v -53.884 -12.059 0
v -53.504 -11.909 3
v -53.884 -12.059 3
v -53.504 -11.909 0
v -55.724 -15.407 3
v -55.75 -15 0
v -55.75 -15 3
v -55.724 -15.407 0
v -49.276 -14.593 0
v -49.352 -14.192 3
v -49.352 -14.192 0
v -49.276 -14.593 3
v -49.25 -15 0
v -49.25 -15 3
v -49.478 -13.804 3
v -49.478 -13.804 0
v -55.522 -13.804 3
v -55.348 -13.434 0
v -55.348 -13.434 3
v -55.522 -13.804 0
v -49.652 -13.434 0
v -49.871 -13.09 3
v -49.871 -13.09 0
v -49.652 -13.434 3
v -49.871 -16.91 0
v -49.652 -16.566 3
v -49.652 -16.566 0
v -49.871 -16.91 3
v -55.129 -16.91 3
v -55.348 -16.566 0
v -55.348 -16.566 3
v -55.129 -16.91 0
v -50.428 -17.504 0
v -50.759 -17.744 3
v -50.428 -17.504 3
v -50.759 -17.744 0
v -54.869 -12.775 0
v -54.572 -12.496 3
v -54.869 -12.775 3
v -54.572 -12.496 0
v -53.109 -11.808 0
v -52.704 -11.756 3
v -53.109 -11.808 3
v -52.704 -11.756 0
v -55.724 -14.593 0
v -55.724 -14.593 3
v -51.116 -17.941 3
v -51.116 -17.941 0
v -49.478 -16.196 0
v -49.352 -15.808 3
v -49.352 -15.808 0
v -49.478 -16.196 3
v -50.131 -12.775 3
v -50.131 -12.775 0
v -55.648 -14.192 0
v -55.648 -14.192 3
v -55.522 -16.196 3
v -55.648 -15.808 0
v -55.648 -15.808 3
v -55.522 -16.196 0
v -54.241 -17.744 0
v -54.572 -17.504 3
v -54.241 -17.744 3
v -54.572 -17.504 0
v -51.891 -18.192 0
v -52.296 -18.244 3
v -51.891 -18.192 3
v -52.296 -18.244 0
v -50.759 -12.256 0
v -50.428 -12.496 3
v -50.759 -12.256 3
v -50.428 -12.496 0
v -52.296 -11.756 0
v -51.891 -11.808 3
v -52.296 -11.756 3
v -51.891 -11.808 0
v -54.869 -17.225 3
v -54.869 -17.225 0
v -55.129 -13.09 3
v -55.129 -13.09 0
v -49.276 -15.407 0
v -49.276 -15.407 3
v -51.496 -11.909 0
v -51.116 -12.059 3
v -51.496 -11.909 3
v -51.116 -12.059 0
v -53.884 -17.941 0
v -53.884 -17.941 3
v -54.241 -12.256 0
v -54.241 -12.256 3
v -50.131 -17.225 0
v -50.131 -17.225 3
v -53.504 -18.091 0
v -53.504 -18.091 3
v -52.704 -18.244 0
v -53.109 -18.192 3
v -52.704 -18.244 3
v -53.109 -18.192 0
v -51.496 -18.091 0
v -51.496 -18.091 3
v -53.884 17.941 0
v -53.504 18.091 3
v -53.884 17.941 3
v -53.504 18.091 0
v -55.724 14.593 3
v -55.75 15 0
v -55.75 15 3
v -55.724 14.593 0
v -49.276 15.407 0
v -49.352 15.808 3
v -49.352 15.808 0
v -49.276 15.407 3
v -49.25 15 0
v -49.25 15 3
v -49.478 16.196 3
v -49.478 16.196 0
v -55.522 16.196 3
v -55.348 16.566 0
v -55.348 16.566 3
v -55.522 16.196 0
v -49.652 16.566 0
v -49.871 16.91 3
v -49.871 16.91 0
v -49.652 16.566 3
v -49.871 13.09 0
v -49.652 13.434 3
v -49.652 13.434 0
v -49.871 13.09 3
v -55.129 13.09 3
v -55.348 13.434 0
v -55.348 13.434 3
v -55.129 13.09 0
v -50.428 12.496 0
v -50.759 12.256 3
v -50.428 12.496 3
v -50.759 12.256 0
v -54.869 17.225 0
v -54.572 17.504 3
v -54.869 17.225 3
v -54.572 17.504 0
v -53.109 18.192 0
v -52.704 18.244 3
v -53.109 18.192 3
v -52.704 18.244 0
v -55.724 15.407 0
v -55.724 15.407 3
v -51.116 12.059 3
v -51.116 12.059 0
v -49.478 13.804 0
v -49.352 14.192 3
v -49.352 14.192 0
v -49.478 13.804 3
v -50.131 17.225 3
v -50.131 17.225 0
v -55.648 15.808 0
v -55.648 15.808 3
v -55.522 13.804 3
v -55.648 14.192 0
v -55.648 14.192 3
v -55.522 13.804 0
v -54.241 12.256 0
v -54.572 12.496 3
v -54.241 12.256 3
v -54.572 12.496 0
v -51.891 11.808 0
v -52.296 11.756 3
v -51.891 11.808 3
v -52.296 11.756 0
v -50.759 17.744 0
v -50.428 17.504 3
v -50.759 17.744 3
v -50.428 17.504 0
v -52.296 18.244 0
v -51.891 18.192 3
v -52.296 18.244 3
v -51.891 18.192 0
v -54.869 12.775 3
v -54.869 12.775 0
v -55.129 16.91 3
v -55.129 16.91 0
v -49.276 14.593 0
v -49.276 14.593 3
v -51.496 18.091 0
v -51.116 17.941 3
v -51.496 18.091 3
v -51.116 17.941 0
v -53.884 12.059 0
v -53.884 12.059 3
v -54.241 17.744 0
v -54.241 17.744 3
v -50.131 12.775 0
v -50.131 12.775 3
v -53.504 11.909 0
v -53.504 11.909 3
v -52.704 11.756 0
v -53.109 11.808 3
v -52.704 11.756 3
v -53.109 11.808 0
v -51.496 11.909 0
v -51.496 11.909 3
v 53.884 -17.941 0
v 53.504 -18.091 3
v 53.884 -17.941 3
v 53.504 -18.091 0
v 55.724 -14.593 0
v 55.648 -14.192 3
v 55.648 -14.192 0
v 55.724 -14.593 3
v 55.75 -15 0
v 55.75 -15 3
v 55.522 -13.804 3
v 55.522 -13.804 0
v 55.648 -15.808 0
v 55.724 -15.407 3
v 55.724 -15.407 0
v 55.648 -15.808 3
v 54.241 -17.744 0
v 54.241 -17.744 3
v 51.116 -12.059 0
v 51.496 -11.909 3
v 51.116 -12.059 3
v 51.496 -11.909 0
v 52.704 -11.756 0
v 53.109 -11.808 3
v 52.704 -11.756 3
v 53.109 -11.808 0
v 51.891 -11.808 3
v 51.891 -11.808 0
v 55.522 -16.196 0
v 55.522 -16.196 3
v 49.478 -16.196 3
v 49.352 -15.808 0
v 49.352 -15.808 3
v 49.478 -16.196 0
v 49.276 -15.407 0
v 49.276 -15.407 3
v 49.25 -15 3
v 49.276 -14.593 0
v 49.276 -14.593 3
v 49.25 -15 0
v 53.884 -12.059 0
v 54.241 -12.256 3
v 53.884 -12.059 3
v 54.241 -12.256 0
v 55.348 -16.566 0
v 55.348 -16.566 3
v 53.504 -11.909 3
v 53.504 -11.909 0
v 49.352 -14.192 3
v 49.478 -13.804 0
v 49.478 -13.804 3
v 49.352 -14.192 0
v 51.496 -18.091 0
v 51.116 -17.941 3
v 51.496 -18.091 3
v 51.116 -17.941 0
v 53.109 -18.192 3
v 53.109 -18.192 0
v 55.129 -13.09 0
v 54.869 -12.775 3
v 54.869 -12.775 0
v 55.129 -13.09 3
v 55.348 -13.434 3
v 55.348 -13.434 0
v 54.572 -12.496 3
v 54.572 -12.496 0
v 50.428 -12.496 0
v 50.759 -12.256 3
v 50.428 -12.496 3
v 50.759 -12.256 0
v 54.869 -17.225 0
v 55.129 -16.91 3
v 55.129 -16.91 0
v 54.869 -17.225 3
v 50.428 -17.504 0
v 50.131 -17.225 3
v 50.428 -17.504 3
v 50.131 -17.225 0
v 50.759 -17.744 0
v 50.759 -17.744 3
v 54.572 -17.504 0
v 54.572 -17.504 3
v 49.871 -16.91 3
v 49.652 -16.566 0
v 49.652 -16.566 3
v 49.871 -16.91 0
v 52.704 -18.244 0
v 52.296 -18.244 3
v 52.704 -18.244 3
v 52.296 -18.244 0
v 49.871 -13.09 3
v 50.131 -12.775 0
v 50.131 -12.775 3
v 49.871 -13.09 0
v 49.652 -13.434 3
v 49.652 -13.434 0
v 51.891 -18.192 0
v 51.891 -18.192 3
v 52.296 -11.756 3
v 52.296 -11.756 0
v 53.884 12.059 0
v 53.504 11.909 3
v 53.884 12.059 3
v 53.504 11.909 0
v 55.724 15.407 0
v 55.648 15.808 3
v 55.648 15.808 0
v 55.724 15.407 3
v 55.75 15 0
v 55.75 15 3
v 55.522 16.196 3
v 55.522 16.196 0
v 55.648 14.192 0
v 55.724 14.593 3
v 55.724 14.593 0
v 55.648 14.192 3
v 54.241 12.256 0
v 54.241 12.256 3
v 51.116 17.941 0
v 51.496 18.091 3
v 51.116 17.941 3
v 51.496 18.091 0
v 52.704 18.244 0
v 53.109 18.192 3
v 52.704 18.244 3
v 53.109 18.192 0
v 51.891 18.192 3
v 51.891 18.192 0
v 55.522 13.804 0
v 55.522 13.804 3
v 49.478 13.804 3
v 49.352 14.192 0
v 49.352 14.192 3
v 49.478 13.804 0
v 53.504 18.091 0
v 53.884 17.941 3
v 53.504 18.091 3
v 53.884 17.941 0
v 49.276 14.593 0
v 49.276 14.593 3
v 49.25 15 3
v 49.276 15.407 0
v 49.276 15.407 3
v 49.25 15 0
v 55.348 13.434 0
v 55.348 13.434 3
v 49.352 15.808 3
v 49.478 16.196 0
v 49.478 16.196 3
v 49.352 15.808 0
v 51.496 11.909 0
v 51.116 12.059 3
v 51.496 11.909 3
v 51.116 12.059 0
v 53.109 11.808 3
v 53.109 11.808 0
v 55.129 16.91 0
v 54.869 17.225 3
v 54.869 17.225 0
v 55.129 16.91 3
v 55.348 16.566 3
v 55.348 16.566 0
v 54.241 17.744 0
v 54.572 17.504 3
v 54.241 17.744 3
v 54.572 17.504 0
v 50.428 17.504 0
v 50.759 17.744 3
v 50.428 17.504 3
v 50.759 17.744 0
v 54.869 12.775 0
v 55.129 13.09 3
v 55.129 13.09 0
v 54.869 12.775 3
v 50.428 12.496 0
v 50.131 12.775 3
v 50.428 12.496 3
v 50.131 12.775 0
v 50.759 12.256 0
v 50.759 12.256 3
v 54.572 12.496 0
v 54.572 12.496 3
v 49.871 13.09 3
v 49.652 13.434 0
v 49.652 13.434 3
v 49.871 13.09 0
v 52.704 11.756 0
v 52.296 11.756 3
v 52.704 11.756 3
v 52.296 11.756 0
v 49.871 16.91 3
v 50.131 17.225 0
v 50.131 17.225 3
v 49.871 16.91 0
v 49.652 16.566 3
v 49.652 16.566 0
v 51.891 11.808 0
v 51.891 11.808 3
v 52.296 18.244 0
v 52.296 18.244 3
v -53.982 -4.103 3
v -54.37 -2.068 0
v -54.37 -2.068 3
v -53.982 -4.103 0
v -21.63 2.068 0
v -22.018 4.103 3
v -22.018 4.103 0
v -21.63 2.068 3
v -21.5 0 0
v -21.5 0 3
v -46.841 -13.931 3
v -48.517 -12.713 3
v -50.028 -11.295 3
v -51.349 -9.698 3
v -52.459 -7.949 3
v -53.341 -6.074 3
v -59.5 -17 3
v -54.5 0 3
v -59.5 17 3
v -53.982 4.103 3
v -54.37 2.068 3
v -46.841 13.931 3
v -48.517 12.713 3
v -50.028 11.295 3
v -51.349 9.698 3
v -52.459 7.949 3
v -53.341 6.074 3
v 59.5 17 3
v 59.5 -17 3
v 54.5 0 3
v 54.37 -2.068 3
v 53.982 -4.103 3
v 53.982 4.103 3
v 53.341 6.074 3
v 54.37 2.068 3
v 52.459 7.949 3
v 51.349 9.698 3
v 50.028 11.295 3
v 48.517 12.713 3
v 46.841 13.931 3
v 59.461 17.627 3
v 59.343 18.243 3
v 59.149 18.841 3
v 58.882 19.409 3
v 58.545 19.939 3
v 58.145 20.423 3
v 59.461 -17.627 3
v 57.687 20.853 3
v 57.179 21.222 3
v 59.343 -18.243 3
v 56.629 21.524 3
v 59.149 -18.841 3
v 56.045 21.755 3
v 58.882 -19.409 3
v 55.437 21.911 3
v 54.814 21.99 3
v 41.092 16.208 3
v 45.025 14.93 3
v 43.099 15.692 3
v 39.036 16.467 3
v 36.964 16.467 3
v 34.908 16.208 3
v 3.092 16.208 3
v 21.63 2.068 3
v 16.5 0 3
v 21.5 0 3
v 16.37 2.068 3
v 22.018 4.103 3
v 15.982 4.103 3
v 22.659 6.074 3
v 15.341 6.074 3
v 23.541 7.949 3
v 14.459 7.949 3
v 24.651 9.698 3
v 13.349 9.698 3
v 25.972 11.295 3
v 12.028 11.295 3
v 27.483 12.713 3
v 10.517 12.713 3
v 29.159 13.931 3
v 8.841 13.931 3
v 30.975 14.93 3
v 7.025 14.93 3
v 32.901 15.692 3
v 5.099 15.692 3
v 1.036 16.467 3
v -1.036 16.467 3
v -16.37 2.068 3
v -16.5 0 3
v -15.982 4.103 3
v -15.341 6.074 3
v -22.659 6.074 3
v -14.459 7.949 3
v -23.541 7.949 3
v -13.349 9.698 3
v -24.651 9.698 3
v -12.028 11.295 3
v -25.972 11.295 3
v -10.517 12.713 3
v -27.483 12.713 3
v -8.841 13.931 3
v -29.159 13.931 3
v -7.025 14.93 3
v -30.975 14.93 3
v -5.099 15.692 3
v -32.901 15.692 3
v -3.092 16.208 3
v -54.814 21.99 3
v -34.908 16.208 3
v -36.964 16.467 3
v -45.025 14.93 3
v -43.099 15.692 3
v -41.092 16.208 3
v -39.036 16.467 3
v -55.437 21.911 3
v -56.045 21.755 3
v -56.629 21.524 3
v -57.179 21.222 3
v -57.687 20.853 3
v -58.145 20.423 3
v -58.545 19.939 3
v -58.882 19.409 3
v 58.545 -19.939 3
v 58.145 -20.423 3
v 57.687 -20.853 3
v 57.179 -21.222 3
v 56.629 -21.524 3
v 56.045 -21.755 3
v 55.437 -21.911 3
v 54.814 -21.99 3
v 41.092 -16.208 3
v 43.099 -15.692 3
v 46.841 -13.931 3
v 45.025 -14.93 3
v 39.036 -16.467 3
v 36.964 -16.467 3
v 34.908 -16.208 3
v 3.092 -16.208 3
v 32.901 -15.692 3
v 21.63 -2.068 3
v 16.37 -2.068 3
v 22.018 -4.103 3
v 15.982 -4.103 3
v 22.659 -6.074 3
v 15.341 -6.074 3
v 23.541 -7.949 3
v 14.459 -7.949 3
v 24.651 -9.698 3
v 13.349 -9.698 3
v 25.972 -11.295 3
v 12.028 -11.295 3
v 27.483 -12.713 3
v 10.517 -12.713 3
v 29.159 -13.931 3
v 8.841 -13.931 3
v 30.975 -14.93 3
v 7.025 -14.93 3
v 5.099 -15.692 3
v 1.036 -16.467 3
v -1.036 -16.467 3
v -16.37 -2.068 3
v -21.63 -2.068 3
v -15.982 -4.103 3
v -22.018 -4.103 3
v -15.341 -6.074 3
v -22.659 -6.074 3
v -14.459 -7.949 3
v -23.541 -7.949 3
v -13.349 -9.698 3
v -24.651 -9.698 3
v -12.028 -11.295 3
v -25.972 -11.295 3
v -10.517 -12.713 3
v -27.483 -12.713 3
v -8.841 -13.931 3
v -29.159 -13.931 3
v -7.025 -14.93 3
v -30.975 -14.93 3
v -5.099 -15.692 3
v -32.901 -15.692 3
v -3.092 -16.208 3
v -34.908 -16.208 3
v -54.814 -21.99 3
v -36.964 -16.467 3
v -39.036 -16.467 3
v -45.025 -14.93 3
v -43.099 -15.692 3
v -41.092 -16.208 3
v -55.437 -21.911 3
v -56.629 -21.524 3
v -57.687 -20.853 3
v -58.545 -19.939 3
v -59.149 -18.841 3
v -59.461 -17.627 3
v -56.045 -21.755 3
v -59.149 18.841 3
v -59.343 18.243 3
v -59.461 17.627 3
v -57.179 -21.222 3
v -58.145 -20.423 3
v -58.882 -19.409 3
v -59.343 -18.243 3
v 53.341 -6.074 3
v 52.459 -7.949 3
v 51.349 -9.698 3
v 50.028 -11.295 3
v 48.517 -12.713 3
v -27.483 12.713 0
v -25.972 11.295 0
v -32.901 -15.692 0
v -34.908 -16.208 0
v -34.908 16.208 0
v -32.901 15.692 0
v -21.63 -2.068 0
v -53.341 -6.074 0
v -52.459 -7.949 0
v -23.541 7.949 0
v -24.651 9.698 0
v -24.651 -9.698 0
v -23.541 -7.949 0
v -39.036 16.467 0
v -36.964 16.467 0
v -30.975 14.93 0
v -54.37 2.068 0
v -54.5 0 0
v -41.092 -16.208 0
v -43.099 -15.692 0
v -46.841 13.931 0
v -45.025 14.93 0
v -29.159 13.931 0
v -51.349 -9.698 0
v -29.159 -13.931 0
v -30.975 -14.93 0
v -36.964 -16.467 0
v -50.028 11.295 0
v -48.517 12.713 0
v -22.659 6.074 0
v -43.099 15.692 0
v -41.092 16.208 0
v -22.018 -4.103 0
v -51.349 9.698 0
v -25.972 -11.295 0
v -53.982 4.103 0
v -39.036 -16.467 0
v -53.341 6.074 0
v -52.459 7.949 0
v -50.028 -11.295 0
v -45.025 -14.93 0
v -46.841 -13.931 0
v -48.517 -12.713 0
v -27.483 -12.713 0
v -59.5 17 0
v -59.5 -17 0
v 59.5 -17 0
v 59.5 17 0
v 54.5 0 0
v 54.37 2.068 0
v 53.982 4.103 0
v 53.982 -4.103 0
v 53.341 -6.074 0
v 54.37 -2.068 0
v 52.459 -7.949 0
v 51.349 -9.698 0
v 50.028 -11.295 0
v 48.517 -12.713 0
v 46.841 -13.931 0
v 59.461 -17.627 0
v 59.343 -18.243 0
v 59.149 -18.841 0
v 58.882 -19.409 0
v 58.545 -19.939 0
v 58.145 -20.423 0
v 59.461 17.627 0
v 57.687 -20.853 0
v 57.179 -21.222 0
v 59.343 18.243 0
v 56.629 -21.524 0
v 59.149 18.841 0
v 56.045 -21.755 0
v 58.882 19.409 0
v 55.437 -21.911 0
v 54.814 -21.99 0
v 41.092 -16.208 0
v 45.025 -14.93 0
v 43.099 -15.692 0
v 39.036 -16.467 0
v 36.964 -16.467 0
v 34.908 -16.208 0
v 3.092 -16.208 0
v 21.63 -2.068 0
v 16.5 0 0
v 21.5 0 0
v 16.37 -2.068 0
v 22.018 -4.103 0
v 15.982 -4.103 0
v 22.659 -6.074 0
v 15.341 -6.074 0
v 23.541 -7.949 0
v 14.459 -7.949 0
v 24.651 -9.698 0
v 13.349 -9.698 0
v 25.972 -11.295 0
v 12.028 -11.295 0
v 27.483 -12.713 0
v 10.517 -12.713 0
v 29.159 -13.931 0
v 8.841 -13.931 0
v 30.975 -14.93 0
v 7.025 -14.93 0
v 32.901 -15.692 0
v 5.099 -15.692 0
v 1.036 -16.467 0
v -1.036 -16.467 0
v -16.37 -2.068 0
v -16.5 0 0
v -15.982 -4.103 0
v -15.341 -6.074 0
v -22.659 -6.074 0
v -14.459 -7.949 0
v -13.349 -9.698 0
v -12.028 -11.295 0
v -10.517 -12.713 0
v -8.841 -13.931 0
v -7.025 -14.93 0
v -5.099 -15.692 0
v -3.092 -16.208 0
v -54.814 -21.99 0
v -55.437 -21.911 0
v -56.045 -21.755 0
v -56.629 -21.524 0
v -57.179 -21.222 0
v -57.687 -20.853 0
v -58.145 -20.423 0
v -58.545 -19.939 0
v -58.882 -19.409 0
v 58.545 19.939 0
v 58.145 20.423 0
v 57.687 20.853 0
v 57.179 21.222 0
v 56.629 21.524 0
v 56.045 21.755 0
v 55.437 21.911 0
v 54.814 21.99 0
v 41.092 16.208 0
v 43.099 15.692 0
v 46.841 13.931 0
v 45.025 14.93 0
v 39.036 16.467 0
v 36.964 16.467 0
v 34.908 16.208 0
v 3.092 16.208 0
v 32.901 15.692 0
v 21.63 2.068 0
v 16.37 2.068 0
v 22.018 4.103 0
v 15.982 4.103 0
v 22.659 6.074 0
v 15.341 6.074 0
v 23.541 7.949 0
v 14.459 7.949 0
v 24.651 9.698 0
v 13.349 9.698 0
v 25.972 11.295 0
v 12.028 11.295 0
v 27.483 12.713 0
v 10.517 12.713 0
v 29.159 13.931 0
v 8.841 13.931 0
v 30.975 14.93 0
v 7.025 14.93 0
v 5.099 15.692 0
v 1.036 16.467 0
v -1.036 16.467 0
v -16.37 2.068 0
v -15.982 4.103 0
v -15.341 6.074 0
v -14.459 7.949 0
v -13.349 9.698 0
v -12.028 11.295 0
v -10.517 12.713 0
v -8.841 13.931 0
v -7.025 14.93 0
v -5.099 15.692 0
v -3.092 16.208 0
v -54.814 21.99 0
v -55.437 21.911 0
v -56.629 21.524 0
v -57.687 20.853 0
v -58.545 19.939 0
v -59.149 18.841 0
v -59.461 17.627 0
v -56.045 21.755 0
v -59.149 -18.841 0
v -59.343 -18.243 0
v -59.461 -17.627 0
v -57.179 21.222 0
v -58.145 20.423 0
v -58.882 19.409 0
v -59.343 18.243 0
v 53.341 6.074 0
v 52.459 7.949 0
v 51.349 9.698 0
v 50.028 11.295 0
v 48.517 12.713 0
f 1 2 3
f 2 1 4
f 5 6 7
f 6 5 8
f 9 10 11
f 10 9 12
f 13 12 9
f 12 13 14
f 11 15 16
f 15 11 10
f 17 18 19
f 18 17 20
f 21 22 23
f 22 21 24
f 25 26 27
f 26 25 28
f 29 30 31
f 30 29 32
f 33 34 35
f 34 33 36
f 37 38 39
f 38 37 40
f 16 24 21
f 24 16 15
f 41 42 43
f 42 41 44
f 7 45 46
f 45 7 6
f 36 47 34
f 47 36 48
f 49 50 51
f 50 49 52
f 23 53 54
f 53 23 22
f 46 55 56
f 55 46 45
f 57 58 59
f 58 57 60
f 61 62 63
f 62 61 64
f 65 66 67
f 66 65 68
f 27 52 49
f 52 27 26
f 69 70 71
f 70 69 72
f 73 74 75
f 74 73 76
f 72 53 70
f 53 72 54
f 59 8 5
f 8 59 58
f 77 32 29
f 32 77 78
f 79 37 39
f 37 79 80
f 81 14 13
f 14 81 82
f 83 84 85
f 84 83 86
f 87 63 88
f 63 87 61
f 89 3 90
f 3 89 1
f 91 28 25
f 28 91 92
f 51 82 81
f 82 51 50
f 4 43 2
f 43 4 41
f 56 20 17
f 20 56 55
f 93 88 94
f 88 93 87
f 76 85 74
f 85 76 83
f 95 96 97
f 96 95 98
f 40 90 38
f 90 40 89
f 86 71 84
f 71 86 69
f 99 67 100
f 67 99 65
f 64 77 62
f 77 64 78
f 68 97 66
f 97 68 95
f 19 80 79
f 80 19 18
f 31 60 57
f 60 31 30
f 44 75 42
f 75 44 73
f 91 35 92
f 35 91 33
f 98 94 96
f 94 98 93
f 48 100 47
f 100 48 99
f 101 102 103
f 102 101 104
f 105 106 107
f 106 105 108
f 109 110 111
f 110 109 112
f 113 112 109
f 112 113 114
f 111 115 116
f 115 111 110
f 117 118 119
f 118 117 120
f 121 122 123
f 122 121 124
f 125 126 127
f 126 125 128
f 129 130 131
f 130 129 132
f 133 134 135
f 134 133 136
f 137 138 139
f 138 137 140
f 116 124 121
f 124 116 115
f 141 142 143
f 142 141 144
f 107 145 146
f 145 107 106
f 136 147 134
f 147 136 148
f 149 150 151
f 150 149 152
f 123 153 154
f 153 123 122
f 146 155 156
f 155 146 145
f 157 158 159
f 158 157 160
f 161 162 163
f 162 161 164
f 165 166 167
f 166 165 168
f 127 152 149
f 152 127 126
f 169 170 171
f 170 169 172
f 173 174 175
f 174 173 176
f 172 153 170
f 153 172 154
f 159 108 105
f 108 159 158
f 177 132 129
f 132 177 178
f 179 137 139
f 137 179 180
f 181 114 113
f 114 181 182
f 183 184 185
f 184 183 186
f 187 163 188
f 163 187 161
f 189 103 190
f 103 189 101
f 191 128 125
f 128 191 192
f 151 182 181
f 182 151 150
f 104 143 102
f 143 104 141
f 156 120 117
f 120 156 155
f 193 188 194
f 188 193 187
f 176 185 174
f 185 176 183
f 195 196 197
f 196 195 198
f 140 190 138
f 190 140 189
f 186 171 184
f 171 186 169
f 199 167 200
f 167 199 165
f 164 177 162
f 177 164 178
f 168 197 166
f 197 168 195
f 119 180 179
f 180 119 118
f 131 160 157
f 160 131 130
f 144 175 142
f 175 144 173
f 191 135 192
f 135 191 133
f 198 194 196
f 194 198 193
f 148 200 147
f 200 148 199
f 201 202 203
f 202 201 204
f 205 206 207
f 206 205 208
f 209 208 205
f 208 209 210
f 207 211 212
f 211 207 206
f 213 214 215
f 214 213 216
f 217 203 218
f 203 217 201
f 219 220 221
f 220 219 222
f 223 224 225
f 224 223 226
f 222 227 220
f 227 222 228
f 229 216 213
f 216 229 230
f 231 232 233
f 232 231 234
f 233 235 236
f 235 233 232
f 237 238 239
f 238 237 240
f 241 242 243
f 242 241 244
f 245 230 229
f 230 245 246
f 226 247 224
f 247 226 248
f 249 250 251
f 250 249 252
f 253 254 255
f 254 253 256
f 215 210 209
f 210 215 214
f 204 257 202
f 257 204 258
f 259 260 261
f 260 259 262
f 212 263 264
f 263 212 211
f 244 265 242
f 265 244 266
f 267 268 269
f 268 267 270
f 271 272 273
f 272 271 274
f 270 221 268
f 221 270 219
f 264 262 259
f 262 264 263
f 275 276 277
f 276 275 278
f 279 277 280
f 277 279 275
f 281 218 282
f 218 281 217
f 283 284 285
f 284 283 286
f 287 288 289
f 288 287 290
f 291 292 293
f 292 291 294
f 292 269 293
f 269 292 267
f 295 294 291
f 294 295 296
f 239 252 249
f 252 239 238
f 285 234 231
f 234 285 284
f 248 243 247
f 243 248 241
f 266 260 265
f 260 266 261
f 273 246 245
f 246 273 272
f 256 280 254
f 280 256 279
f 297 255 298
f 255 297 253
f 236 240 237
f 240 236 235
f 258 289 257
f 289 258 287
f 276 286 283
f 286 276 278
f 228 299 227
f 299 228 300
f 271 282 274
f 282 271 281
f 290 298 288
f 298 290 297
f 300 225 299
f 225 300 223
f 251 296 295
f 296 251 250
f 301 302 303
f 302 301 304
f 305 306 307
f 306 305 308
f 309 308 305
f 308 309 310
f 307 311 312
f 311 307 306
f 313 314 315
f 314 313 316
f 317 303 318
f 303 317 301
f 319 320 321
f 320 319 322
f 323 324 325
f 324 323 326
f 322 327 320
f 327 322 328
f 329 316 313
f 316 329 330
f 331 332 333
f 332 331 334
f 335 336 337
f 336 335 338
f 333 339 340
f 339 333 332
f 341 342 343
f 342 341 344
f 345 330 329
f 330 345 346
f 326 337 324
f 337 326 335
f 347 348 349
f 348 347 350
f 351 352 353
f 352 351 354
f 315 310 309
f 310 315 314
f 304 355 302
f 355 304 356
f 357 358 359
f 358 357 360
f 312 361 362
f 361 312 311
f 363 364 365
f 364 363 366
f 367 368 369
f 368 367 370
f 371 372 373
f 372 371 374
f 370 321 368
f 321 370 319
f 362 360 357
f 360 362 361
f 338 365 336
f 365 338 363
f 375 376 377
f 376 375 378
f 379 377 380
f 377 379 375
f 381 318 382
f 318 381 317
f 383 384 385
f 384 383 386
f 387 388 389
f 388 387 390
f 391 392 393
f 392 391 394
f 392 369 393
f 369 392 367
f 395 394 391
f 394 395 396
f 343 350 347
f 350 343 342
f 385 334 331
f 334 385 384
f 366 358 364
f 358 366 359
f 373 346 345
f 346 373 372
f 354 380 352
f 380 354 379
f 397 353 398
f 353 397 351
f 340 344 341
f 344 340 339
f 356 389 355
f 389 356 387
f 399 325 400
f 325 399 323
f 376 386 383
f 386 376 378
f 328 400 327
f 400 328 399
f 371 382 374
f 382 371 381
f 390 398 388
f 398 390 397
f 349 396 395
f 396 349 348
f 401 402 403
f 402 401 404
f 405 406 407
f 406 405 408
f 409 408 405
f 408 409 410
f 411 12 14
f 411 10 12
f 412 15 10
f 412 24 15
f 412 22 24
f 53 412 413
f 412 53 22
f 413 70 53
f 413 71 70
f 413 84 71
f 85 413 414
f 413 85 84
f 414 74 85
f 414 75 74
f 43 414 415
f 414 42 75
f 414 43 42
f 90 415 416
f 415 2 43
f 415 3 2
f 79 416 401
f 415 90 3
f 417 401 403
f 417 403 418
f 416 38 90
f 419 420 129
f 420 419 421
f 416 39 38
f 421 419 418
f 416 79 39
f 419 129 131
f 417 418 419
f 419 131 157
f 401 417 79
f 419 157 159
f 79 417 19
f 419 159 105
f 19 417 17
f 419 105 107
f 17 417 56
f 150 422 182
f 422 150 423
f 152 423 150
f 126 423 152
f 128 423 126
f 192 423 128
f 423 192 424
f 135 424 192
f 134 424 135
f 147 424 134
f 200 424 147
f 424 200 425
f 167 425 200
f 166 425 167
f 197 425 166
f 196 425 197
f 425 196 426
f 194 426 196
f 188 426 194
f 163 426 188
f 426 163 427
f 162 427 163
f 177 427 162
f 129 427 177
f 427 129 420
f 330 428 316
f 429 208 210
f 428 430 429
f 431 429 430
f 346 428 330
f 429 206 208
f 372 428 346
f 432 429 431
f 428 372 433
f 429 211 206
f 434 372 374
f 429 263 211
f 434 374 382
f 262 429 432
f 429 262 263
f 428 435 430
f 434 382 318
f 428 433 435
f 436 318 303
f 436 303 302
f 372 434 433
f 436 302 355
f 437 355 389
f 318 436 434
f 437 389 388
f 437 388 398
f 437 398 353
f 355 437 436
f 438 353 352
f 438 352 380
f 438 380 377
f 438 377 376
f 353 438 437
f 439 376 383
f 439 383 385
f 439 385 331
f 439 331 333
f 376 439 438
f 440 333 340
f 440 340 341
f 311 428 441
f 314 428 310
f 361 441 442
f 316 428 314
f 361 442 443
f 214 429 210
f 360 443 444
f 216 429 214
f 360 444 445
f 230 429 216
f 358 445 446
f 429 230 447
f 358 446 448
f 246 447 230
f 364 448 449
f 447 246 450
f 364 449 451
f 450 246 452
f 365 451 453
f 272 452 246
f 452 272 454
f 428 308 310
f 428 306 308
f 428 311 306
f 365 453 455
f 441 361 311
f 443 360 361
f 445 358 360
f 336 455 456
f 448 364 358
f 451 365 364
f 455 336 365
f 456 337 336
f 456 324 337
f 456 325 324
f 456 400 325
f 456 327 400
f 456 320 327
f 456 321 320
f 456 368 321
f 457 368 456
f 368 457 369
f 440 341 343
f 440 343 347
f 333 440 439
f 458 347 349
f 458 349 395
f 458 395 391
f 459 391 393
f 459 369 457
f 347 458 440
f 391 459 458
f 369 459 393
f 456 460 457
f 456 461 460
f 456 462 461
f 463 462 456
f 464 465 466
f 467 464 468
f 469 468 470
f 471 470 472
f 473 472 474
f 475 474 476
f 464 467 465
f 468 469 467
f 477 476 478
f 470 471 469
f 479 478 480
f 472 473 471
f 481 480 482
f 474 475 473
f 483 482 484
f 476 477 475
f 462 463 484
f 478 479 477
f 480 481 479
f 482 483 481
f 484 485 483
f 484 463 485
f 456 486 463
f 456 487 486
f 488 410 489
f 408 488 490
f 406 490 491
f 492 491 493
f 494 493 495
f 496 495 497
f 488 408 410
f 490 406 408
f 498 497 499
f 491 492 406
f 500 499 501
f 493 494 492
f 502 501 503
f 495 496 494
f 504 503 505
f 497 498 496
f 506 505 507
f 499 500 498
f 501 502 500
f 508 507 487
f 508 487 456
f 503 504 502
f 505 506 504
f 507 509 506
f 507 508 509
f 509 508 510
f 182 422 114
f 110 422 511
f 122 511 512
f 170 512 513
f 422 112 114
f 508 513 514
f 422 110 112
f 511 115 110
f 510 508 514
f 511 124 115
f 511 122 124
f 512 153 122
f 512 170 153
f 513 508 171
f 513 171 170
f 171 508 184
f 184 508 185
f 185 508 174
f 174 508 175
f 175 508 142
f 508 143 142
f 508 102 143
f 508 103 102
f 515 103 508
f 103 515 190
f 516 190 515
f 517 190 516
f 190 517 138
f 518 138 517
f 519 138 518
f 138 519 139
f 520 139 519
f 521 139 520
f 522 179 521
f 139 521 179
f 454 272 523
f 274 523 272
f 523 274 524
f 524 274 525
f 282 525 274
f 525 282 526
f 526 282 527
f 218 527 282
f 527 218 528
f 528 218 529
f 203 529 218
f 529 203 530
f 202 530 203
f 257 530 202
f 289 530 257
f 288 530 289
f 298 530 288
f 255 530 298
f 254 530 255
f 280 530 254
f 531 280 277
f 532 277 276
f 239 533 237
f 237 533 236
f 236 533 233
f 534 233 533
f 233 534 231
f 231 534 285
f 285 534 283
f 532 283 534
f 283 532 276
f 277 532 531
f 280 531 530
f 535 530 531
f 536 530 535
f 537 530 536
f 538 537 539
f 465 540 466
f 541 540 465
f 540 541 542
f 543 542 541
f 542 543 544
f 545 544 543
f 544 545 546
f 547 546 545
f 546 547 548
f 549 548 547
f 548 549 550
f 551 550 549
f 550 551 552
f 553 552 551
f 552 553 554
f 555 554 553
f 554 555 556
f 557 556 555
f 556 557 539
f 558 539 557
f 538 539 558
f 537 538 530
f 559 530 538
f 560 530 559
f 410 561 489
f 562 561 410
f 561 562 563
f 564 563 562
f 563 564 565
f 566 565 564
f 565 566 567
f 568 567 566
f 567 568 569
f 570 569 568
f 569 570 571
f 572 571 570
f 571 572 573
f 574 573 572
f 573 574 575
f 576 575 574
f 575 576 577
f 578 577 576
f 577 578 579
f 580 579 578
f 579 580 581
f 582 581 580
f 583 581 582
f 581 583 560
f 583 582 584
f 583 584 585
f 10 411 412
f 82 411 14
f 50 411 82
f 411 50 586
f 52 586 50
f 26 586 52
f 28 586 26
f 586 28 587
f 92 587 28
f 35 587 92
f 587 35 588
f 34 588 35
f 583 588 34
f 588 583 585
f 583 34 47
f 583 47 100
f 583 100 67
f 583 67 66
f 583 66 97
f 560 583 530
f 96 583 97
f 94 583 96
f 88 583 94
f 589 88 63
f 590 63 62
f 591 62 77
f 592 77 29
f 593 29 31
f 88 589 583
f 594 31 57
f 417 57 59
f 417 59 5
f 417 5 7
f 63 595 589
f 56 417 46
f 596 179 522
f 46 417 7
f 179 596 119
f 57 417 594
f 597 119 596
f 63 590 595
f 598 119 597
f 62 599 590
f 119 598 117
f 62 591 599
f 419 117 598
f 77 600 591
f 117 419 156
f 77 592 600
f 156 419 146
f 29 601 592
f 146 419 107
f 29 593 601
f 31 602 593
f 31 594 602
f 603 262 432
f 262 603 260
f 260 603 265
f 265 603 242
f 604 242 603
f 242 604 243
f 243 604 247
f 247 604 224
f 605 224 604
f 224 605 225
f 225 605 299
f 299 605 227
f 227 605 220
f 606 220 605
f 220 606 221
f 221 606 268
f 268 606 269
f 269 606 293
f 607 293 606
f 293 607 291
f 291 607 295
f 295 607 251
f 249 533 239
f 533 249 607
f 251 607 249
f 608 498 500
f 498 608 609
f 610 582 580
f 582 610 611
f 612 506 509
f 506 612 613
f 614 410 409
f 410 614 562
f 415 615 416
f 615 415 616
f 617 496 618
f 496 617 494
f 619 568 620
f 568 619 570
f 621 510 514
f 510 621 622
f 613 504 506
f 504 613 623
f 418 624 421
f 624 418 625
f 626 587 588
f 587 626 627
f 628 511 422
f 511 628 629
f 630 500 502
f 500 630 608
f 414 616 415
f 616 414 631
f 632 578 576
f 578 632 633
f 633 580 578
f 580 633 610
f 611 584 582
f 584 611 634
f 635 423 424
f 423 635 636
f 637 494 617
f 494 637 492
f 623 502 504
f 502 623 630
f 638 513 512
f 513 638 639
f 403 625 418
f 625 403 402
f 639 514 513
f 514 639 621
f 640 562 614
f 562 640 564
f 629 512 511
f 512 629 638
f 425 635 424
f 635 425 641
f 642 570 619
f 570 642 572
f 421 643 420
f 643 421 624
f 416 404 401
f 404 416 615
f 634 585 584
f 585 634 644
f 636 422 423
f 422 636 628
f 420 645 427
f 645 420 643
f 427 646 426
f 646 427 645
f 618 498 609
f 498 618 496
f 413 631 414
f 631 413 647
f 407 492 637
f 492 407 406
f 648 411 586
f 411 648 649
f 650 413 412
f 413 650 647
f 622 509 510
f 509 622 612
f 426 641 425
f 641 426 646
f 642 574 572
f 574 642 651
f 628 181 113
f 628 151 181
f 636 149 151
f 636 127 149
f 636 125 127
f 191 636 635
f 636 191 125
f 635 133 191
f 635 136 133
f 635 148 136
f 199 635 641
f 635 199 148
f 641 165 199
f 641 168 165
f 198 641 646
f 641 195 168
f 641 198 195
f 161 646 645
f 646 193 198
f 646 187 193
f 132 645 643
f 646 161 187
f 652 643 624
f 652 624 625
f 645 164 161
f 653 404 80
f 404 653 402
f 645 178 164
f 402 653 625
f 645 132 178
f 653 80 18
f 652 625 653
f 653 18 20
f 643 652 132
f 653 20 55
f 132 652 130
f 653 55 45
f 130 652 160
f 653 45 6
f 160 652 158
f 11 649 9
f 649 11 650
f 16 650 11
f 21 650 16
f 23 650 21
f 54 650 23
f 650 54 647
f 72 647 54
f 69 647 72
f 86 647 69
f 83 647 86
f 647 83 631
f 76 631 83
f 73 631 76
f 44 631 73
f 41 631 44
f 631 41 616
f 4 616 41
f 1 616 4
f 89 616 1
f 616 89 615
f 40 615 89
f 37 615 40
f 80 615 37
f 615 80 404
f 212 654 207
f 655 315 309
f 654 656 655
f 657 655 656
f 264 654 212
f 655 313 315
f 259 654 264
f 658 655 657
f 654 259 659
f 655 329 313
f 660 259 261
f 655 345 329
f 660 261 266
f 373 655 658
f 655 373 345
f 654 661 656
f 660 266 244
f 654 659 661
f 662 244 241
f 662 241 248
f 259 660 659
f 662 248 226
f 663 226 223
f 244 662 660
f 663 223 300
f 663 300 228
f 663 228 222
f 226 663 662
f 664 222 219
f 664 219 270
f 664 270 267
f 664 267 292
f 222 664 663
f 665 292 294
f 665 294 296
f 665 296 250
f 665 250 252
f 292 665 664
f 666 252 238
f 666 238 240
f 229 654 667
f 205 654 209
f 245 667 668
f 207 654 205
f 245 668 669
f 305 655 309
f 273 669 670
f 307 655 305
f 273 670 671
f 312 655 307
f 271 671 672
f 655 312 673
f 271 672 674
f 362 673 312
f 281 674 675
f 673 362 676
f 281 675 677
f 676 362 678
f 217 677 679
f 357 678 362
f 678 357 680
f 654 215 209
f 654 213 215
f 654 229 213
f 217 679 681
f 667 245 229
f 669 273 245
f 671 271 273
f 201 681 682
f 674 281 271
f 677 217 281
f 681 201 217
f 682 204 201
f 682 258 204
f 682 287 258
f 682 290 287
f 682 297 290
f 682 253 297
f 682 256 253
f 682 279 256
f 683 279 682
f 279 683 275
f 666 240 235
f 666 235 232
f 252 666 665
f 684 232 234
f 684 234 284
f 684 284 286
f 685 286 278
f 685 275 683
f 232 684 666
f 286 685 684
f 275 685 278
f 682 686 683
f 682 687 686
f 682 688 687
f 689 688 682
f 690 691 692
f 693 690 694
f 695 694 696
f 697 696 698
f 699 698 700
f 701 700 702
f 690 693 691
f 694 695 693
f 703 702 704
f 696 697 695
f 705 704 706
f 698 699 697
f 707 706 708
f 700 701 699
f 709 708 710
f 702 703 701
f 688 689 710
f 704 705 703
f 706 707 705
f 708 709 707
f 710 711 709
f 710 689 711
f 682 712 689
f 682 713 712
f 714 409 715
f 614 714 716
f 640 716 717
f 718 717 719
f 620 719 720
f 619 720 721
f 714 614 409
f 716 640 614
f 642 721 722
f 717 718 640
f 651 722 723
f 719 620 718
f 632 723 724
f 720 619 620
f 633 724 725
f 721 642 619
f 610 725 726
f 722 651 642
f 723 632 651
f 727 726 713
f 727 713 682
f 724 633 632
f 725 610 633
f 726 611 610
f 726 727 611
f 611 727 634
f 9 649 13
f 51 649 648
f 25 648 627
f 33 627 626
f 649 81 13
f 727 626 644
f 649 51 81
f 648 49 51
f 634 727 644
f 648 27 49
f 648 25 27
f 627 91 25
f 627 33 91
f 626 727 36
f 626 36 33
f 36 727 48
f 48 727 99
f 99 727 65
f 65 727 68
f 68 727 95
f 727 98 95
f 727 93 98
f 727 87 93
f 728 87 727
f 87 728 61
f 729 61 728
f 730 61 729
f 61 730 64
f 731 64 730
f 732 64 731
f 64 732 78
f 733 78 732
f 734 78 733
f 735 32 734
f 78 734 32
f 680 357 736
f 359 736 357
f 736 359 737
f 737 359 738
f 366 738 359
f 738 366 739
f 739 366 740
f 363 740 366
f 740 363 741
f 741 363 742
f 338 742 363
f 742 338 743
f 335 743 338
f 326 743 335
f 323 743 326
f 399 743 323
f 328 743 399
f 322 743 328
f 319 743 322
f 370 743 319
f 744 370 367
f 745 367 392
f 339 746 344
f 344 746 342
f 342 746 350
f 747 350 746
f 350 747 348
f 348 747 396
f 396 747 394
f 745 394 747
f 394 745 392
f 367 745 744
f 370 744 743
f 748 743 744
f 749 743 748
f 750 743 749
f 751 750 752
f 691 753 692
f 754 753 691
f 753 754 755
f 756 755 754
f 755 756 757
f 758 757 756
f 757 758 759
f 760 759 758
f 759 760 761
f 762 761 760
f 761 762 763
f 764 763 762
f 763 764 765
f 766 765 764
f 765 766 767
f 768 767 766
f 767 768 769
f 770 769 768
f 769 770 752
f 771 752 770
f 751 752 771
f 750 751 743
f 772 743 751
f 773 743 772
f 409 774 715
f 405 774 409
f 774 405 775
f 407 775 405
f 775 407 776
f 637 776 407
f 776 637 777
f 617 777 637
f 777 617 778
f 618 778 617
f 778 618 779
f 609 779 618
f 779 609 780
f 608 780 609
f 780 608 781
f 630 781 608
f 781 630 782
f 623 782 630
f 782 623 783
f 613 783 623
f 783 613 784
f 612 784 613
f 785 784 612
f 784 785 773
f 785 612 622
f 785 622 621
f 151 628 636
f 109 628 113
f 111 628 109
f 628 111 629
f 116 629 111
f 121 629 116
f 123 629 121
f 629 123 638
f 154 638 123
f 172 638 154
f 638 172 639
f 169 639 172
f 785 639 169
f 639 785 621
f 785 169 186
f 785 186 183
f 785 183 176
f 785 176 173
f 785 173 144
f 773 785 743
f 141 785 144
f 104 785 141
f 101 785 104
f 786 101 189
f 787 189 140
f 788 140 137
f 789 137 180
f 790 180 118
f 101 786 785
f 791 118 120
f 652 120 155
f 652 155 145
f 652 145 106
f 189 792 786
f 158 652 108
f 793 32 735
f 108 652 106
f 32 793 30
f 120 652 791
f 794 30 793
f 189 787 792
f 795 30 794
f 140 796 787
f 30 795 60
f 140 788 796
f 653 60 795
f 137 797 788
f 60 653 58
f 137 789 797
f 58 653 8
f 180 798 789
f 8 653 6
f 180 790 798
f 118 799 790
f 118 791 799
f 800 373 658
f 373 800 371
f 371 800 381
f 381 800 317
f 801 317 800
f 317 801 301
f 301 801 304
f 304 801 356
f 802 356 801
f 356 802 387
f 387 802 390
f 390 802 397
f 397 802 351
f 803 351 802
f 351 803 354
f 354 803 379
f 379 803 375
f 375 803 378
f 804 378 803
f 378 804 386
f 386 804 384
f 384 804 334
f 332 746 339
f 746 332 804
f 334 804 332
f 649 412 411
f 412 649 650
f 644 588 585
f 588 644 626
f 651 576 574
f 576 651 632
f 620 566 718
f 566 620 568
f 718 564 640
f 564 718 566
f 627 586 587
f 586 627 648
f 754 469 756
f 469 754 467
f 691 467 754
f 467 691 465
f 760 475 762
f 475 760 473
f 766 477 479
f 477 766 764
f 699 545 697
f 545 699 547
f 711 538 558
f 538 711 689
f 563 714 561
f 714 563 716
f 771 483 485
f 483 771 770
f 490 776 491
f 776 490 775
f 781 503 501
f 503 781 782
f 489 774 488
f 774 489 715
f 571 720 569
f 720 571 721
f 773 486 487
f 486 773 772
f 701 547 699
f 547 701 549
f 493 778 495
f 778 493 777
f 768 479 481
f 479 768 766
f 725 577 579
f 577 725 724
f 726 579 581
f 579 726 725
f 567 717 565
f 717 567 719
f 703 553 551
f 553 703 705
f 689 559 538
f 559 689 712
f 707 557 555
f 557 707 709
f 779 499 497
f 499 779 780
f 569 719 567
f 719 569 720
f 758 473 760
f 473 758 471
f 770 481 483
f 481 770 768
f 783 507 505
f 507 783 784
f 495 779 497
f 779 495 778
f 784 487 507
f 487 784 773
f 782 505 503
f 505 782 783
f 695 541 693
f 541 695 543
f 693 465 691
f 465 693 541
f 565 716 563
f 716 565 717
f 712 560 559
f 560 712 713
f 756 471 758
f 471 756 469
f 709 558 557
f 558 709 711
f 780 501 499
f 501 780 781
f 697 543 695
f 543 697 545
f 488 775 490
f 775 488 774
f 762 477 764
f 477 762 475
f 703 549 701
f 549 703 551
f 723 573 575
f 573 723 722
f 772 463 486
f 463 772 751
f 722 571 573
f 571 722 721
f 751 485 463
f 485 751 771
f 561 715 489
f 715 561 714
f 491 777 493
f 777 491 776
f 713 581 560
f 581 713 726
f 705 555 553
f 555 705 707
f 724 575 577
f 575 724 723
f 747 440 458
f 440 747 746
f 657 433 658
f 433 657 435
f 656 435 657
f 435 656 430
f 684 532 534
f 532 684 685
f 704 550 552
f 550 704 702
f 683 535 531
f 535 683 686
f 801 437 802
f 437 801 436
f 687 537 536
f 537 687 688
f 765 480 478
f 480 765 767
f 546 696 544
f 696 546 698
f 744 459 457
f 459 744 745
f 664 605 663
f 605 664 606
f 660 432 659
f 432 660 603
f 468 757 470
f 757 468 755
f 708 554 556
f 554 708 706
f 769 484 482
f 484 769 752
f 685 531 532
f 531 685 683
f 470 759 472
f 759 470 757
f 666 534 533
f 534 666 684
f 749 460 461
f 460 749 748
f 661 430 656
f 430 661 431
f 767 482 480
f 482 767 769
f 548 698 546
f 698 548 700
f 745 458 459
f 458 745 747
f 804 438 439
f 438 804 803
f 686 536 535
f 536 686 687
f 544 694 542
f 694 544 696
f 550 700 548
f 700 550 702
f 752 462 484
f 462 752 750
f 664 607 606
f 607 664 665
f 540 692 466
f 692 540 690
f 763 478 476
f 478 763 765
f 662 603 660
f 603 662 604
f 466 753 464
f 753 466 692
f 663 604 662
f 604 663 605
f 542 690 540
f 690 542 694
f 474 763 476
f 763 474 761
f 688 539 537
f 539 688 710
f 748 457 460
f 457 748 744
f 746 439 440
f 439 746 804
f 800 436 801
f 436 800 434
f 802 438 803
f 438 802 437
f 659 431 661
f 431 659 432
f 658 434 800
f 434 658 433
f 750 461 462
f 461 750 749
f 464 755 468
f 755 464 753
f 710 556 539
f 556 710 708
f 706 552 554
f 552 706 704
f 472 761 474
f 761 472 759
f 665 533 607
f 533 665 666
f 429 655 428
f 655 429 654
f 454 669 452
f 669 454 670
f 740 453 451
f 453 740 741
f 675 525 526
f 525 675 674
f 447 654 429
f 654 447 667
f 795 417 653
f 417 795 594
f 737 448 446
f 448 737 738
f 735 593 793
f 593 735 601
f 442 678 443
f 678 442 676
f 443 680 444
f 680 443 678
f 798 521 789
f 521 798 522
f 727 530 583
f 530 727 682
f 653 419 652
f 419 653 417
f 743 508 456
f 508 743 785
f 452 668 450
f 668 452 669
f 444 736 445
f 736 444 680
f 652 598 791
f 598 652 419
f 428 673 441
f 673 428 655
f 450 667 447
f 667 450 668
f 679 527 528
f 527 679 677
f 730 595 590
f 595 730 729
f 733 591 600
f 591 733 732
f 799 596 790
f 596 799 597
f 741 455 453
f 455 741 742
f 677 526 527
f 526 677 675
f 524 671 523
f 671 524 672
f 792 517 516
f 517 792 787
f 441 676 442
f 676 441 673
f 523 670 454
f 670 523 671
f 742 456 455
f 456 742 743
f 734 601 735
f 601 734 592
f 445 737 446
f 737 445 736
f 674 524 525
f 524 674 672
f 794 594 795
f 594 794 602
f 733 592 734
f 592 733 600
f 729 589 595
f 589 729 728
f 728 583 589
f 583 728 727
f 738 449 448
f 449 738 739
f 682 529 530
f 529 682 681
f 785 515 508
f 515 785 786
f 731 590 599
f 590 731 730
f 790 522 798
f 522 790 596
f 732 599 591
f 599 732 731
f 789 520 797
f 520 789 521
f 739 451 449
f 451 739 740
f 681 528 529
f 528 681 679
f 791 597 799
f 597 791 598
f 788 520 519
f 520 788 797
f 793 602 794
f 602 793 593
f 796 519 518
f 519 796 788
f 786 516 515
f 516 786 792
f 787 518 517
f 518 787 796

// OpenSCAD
$fn = 50;


difference() {
	union() {
		hull() {
			translate(v = [-54.5000000000, 17.0000000000, 0]) {
				cylinder(h = 3, r = 5);
			}
			translate(v = [54.5000000000, 17.0000000000, 0]) {
				cylinder(h = 3, r = 5);
			}
			translate(v = [-54.5000000000, -17.0000000000, 0]) {
				cylinder(h = 3, r = 5);
			}
			translate(v = [54.5000000000, -17.0000000000, 0]) {
				cylinder(h = 3, r = 5);
			}
		}
	}
	union() {
		#translate(v = [-52.5000000000, -15.0000000000, -100.0000000000]) {
			cylinder(h = 200, r = 3.2500000000);
		}
		#translate(v = [-52.5000000000, 15.0000000000, -100.0000000000]) {
			cylinder(h = 200, r = 3.2500000000);
		}
		#translate(v = [52.5000000000, -15.0000000000, -100.0000000000]) {
			cylinder(h = 200, r = 3.2500000000);
		}
		#translate(v = [52.5000000000, 15.0000000000, -100.0000000000]) {
			cylinder(h = 200, r = 3.2500000000);
		}
		#translate(v = [-38.0000000000, 0, 0]) {
			cylinder(h = 3, r = 16.5000000000);
		}
		#cylinder(h = 3, r = 16.5000000000);
		#translate(v = [38.0000000000, 0, 0]) {
			cylinder(h = 3, r = 16.5000000000);
		}
	}
}
